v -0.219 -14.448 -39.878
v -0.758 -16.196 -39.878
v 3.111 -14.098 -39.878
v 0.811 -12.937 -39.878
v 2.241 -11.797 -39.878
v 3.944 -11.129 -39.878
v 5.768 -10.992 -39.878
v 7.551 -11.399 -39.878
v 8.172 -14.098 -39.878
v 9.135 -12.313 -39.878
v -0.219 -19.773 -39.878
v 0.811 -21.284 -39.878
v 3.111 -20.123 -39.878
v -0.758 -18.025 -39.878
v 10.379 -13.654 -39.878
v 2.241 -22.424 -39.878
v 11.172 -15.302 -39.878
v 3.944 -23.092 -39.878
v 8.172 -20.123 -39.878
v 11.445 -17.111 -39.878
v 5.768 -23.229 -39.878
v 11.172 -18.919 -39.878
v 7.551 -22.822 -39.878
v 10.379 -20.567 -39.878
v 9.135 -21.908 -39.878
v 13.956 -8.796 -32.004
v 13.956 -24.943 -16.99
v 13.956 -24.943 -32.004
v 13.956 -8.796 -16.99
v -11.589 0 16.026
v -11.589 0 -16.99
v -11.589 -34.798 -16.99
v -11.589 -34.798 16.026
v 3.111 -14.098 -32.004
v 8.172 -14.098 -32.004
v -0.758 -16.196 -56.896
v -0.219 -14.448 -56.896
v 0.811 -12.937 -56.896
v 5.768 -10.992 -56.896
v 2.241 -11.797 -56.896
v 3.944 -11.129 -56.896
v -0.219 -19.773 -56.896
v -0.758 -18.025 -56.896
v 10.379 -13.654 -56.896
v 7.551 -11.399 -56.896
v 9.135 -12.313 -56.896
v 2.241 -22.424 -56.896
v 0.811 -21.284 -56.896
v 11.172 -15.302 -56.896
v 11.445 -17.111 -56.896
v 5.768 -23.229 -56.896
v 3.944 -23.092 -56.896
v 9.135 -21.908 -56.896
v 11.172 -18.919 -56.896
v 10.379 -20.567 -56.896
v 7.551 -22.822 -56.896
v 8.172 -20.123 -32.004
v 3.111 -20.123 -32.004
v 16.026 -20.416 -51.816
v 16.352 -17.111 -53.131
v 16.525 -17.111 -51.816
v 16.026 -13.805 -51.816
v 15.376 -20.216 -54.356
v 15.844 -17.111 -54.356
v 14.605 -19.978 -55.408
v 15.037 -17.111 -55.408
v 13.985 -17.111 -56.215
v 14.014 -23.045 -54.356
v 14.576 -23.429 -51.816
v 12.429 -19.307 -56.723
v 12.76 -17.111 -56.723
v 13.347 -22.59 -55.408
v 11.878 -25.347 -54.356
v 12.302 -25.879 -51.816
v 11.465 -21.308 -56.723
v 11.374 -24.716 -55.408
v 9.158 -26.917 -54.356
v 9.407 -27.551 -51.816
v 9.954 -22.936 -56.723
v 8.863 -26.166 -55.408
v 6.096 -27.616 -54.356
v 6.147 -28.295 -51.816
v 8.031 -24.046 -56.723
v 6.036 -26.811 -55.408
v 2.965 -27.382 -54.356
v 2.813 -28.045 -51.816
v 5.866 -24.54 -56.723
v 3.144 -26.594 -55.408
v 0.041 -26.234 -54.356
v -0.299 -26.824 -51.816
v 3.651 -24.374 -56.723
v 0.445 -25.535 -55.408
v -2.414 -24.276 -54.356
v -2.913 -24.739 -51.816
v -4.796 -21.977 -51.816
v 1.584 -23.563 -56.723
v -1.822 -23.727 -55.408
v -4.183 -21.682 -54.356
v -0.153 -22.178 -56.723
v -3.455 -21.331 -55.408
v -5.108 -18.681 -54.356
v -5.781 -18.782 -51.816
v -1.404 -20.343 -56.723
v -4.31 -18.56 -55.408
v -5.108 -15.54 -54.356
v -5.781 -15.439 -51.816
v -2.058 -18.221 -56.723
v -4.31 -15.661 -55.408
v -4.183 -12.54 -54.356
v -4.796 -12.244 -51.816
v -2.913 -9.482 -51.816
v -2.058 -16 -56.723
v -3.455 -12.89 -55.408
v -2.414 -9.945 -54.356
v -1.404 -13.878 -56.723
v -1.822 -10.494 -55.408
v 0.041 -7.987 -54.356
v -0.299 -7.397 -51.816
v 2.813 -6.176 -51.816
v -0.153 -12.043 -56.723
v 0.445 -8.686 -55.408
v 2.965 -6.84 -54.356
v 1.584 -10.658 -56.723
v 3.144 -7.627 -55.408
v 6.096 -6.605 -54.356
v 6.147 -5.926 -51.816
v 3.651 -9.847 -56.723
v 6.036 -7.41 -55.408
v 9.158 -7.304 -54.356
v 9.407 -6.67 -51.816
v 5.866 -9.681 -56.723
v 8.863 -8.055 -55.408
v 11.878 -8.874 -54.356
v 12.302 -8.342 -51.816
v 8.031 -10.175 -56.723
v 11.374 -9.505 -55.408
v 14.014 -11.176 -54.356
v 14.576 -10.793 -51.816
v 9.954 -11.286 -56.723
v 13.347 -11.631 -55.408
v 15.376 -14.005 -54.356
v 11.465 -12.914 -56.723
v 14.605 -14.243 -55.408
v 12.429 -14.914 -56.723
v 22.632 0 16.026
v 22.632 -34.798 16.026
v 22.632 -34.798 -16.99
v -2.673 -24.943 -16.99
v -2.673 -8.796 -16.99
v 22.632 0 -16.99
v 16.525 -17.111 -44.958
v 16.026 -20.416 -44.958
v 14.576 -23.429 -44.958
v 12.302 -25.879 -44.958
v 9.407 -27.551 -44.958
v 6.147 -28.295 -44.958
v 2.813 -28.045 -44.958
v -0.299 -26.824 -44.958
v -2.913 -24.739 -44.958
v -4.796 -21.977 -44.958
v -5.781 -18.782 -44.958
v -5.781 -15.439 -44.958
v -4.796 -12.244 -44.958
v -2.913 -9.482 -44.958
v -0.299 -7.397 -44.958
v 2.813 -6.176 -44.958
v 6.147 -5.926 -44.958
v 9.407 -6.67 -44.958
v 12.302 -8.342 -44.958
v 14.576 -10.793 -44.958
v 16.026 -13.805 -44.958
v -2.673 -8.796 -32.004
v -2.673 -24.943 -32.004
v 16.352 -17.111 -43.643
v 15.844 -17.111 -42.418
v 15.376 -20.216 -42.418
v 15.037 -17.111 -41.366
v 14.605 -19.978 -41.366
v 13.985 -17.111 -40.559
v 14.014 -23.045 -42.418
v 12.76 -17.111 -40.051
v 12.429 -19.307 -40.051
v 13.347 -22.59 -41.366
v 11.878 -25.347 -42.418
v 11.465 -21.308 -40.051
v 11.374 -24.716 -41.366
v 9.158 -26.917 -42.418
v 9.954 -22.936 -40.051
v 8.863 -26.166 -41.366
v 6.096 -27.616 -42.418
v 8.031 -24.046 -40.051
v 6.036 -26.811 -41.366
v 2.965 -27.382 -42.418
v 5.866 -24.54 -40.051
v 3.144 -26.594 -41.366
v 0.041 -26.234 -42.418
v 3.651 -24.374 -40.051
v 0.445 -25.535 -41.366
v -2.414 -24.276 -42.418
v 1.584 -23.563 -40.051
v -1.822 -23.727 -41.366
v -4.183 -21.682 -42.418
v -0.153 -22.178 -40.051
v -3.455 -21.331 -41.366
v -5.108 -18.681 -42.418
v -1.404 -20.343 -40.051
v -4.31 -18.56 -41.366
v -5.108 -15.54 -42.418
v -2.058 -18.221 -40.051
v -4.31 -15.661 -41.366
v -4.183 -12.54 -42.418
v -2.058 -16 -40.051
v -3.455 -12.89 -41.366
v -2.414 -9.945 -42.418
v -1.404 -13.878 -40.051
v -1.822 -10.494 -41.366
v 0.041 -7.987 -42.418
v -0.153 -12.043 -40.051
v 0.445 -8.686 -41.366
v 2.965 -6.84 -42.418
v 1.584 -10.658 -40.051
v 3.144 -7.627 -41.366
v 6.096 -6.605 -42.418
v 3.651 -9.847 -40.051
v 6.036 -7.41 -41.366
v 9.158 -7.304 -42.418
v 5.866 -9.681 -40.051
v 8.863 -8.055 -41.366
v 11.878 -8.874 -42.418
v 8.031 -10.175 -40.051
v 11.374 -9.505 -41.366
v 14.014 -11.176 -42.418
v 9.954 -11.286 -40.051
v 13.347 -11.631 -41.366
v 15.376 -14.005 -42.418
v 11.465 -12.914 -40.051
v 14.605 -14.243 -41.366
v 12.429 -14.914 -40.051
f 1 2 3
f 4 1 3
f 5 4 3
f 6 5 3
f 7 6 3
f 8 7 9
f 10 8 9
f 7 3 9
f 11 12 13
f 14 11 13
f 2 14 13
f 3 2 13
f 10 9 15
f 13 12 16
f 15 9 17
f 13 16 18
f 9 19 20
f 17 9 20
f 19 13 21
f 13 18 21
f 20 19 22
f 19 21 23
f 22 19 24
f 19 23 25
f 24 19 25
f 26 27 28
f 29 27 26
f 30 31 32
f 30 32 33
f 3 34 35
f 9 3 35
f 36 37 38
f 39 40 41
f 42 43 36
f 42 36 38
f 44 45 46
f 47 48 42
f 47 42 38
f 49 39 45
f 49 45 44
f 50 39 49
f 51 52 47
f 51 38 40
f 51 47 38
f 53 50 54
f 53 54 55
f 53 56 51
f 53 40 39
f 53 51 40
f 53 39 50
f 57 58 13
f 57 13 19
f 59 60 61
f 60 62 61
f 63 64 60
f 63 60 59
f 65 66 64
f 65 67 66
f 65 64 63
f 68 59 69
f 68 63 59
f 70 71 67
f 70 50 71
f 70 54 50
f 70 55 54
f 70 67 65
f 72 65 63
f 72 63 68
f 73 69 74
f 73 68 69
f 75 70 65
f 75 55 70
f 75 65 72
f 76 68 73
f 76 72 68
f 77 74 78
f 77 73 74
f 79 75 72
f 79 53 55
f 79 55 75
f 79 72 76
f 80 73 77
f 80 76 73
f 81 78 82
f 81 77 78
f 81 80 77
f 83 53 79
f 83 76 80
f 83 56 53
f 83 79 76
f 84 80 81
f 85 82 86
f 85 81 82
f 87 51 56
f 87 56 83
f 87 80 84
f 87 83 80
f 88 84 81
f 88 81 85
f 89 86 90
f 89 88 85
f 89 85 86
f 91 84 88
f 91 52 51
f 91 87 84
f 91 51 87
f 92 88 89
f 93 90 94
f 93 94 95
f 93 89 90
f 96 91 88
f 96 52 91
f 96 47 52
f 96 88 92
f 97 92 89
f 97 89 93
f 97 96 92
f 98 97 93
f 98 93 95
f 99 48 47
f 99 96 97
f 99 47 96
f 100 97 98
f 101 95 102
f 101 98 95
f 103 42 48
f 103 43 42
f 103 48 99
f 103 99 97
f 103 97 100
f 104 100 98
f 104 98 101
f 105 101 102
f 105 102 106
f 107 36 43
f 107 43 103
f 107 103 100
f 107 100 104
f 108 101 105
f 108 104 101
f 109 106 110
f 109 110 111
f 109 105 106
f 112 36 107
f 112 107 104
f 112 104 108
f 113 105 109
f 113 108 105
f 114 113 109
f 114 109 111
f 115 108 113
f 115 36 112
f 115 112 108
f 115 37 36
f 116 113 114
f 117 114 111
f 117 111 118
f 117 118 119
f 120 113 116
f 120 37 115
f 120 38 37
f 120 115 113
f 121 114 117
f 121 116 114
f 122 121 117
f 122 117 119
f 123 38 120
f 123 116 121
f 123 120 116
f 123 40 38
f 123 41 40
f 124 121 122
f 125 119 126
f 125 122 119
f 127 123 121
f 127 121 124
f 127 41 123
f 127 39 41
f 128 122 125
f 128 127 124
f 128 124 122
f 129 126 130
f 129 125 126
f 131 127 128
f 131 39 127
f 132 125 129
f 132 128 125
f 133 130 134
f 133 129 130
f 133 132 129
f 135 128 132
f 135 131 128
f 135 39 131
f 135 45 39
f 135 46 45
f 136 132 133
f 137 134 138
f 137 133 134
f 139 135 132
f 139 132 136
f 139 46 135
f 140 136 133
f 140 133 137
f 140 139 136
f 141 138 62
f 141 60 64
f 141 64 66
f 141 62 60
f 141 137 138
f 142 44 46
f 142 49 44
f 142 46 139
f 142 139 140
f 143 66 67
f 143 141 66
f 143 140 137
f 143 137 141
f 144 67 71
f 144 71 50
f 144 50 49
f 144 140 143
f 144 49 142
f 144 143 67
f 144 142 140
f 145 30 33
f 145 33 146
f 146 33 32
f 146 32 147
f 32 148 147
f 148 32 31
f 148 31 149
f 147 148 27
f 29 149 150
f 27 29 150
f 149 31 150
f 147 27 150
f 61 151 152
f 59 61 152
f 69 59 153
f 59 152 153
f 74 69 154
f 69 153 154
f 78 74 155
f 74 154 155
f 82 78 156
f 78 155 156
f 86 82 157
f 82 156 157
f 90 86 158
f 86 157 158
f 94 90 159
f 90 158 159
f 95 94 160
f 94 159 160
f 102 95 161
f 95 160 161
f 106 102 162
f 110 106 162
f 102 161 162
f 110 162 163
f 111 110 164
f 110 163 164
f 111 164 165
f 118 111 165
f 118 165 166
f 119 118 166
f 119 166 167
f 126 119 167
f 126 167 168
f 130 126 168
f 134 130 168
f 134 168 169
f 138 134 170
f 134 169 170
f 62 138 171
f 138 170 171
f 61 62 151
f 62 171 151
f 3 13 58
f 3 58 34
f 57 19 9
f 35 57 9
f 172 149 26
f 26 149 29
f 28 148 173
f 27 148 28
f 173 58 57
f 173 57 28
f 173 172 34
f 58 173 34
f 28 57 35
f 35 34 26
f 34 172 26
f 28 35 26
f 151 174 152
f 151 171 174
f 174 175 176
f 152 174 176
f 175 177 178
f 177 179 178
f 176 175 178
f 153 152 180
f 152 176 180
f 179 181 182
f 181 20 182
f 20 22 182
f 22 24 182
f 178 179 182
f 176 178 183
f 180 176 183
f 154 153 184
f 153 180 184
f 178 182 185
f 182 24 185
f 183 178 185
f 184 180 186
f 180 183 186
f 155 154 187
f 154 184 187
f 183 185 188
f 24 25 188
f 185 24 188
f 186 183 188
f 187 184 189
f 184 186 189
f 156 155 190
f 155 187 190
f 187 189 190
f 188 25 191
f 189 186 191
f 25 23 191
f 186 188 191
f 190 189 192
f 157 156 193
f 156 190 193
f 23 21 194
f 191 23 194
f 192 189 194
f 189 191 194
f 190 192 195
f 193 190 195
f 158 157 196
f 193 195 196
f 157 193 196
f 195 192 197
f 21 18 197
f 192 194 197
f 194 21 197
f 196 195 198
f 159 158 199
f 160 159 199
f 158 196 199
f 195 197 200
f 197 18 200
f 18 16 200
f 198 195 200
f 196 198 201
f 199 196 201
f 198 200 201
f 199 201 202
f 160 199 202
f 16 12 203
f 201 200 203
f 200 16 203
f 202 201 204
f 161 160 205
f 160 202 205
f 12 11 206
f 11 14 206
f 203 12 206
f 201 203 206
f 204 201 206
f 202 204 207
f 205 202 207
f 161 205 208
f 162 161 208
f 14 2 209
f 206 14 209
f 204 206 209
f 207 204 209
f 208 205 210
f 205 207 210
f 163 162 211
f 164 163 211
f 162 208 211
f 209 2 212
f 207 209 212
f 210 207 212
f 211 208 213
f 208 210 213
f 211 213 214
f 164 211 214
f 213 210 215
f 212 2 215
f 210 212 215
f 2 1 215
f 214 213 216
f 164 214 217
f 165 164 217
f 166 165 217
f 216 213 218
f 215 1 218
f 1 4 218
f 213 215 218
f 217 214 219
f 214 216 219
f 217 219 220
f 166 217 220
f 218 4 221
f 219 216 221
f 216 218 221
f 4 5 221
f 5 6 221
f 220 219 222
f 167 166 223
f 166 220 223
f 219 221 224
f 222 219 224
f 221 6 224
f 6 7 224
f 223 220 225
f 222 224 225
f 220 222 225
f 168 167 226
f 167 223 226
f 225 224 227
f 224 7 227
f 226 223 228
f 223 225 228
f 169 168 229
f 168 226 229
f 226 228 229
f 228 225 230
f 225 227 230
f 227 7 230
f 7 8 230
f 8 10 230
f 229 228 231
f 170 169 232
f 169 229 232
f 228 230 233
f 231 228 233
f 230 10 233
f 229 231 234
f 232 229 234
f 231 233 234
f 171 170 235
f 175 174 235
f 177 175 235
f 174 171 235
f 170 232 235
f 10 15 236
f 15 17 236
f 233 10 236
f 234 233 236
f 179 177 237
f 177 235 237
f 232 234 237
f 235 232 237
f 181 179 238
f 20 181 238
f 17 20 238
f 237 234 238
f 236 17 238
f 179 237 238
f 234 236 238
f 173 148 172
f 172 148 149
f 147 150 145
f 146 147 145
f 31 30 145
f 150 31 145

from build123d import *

# Parameters (mm, degrees)
F0_W     = 34.221142
F0_H     = 33.016175
F1_DEPTH = 34.798
F2_W     = 16.628581
F2_H     = 16.146597
F3_DEPTH = 32.004
F4_W     = 5.060869
F4_H     = 6.024849
F5_DEPTH = 39.878
F6_R     = 11.215709
F7_DEPTH = 17.018
F8_R     = 5.08


with BuildPart() as f1:
    # F0 (on Front) → F1 (new body)
    with BuildSketch(Plane.XZ):
        with Locations((5.521229, -0.481988)):
            Rectangle(F0_W, F0_H)
    extrude(amount=F1_DEPTH)

    # F2 (on Top) → F3 (join)
    with BuildSketch(Plane.XY):
        with Locations((5.641728, -16.869578)):
            Rectangle(F2_W, F2_H)
    extrude(amount=-F3_DEPTH)

    # F4 (on Top) → F5 (join)
    with BuildSketch(Plane.XY):
        with Locations((5.641728, -17.110572)):
            Rectangle(F4_W, F4_H)
    extrude(amount=-F5_DEPTH)

    # F6 (on face) → F7 (join)
    with BuildSketch(Plane(origin=(0, 0, -39.878), x_dir=(1, 0, 0), z_dir=(0, 0, -1))):
        with Locations((5.309023, 17.110573)):
            Circle(F6_R)
    extrude(amount=F7_DEPTH)

    # F8
    f8_edges = [f1.edges().sort_by_distance(p)[0] for p in [
        (-5.906686, -17.110573, -56.896),
        (-5.906686, -17.110573, -39.878),
    ]]
    fillet(f8_edges, radius=F8_R)


solid = f1.part
